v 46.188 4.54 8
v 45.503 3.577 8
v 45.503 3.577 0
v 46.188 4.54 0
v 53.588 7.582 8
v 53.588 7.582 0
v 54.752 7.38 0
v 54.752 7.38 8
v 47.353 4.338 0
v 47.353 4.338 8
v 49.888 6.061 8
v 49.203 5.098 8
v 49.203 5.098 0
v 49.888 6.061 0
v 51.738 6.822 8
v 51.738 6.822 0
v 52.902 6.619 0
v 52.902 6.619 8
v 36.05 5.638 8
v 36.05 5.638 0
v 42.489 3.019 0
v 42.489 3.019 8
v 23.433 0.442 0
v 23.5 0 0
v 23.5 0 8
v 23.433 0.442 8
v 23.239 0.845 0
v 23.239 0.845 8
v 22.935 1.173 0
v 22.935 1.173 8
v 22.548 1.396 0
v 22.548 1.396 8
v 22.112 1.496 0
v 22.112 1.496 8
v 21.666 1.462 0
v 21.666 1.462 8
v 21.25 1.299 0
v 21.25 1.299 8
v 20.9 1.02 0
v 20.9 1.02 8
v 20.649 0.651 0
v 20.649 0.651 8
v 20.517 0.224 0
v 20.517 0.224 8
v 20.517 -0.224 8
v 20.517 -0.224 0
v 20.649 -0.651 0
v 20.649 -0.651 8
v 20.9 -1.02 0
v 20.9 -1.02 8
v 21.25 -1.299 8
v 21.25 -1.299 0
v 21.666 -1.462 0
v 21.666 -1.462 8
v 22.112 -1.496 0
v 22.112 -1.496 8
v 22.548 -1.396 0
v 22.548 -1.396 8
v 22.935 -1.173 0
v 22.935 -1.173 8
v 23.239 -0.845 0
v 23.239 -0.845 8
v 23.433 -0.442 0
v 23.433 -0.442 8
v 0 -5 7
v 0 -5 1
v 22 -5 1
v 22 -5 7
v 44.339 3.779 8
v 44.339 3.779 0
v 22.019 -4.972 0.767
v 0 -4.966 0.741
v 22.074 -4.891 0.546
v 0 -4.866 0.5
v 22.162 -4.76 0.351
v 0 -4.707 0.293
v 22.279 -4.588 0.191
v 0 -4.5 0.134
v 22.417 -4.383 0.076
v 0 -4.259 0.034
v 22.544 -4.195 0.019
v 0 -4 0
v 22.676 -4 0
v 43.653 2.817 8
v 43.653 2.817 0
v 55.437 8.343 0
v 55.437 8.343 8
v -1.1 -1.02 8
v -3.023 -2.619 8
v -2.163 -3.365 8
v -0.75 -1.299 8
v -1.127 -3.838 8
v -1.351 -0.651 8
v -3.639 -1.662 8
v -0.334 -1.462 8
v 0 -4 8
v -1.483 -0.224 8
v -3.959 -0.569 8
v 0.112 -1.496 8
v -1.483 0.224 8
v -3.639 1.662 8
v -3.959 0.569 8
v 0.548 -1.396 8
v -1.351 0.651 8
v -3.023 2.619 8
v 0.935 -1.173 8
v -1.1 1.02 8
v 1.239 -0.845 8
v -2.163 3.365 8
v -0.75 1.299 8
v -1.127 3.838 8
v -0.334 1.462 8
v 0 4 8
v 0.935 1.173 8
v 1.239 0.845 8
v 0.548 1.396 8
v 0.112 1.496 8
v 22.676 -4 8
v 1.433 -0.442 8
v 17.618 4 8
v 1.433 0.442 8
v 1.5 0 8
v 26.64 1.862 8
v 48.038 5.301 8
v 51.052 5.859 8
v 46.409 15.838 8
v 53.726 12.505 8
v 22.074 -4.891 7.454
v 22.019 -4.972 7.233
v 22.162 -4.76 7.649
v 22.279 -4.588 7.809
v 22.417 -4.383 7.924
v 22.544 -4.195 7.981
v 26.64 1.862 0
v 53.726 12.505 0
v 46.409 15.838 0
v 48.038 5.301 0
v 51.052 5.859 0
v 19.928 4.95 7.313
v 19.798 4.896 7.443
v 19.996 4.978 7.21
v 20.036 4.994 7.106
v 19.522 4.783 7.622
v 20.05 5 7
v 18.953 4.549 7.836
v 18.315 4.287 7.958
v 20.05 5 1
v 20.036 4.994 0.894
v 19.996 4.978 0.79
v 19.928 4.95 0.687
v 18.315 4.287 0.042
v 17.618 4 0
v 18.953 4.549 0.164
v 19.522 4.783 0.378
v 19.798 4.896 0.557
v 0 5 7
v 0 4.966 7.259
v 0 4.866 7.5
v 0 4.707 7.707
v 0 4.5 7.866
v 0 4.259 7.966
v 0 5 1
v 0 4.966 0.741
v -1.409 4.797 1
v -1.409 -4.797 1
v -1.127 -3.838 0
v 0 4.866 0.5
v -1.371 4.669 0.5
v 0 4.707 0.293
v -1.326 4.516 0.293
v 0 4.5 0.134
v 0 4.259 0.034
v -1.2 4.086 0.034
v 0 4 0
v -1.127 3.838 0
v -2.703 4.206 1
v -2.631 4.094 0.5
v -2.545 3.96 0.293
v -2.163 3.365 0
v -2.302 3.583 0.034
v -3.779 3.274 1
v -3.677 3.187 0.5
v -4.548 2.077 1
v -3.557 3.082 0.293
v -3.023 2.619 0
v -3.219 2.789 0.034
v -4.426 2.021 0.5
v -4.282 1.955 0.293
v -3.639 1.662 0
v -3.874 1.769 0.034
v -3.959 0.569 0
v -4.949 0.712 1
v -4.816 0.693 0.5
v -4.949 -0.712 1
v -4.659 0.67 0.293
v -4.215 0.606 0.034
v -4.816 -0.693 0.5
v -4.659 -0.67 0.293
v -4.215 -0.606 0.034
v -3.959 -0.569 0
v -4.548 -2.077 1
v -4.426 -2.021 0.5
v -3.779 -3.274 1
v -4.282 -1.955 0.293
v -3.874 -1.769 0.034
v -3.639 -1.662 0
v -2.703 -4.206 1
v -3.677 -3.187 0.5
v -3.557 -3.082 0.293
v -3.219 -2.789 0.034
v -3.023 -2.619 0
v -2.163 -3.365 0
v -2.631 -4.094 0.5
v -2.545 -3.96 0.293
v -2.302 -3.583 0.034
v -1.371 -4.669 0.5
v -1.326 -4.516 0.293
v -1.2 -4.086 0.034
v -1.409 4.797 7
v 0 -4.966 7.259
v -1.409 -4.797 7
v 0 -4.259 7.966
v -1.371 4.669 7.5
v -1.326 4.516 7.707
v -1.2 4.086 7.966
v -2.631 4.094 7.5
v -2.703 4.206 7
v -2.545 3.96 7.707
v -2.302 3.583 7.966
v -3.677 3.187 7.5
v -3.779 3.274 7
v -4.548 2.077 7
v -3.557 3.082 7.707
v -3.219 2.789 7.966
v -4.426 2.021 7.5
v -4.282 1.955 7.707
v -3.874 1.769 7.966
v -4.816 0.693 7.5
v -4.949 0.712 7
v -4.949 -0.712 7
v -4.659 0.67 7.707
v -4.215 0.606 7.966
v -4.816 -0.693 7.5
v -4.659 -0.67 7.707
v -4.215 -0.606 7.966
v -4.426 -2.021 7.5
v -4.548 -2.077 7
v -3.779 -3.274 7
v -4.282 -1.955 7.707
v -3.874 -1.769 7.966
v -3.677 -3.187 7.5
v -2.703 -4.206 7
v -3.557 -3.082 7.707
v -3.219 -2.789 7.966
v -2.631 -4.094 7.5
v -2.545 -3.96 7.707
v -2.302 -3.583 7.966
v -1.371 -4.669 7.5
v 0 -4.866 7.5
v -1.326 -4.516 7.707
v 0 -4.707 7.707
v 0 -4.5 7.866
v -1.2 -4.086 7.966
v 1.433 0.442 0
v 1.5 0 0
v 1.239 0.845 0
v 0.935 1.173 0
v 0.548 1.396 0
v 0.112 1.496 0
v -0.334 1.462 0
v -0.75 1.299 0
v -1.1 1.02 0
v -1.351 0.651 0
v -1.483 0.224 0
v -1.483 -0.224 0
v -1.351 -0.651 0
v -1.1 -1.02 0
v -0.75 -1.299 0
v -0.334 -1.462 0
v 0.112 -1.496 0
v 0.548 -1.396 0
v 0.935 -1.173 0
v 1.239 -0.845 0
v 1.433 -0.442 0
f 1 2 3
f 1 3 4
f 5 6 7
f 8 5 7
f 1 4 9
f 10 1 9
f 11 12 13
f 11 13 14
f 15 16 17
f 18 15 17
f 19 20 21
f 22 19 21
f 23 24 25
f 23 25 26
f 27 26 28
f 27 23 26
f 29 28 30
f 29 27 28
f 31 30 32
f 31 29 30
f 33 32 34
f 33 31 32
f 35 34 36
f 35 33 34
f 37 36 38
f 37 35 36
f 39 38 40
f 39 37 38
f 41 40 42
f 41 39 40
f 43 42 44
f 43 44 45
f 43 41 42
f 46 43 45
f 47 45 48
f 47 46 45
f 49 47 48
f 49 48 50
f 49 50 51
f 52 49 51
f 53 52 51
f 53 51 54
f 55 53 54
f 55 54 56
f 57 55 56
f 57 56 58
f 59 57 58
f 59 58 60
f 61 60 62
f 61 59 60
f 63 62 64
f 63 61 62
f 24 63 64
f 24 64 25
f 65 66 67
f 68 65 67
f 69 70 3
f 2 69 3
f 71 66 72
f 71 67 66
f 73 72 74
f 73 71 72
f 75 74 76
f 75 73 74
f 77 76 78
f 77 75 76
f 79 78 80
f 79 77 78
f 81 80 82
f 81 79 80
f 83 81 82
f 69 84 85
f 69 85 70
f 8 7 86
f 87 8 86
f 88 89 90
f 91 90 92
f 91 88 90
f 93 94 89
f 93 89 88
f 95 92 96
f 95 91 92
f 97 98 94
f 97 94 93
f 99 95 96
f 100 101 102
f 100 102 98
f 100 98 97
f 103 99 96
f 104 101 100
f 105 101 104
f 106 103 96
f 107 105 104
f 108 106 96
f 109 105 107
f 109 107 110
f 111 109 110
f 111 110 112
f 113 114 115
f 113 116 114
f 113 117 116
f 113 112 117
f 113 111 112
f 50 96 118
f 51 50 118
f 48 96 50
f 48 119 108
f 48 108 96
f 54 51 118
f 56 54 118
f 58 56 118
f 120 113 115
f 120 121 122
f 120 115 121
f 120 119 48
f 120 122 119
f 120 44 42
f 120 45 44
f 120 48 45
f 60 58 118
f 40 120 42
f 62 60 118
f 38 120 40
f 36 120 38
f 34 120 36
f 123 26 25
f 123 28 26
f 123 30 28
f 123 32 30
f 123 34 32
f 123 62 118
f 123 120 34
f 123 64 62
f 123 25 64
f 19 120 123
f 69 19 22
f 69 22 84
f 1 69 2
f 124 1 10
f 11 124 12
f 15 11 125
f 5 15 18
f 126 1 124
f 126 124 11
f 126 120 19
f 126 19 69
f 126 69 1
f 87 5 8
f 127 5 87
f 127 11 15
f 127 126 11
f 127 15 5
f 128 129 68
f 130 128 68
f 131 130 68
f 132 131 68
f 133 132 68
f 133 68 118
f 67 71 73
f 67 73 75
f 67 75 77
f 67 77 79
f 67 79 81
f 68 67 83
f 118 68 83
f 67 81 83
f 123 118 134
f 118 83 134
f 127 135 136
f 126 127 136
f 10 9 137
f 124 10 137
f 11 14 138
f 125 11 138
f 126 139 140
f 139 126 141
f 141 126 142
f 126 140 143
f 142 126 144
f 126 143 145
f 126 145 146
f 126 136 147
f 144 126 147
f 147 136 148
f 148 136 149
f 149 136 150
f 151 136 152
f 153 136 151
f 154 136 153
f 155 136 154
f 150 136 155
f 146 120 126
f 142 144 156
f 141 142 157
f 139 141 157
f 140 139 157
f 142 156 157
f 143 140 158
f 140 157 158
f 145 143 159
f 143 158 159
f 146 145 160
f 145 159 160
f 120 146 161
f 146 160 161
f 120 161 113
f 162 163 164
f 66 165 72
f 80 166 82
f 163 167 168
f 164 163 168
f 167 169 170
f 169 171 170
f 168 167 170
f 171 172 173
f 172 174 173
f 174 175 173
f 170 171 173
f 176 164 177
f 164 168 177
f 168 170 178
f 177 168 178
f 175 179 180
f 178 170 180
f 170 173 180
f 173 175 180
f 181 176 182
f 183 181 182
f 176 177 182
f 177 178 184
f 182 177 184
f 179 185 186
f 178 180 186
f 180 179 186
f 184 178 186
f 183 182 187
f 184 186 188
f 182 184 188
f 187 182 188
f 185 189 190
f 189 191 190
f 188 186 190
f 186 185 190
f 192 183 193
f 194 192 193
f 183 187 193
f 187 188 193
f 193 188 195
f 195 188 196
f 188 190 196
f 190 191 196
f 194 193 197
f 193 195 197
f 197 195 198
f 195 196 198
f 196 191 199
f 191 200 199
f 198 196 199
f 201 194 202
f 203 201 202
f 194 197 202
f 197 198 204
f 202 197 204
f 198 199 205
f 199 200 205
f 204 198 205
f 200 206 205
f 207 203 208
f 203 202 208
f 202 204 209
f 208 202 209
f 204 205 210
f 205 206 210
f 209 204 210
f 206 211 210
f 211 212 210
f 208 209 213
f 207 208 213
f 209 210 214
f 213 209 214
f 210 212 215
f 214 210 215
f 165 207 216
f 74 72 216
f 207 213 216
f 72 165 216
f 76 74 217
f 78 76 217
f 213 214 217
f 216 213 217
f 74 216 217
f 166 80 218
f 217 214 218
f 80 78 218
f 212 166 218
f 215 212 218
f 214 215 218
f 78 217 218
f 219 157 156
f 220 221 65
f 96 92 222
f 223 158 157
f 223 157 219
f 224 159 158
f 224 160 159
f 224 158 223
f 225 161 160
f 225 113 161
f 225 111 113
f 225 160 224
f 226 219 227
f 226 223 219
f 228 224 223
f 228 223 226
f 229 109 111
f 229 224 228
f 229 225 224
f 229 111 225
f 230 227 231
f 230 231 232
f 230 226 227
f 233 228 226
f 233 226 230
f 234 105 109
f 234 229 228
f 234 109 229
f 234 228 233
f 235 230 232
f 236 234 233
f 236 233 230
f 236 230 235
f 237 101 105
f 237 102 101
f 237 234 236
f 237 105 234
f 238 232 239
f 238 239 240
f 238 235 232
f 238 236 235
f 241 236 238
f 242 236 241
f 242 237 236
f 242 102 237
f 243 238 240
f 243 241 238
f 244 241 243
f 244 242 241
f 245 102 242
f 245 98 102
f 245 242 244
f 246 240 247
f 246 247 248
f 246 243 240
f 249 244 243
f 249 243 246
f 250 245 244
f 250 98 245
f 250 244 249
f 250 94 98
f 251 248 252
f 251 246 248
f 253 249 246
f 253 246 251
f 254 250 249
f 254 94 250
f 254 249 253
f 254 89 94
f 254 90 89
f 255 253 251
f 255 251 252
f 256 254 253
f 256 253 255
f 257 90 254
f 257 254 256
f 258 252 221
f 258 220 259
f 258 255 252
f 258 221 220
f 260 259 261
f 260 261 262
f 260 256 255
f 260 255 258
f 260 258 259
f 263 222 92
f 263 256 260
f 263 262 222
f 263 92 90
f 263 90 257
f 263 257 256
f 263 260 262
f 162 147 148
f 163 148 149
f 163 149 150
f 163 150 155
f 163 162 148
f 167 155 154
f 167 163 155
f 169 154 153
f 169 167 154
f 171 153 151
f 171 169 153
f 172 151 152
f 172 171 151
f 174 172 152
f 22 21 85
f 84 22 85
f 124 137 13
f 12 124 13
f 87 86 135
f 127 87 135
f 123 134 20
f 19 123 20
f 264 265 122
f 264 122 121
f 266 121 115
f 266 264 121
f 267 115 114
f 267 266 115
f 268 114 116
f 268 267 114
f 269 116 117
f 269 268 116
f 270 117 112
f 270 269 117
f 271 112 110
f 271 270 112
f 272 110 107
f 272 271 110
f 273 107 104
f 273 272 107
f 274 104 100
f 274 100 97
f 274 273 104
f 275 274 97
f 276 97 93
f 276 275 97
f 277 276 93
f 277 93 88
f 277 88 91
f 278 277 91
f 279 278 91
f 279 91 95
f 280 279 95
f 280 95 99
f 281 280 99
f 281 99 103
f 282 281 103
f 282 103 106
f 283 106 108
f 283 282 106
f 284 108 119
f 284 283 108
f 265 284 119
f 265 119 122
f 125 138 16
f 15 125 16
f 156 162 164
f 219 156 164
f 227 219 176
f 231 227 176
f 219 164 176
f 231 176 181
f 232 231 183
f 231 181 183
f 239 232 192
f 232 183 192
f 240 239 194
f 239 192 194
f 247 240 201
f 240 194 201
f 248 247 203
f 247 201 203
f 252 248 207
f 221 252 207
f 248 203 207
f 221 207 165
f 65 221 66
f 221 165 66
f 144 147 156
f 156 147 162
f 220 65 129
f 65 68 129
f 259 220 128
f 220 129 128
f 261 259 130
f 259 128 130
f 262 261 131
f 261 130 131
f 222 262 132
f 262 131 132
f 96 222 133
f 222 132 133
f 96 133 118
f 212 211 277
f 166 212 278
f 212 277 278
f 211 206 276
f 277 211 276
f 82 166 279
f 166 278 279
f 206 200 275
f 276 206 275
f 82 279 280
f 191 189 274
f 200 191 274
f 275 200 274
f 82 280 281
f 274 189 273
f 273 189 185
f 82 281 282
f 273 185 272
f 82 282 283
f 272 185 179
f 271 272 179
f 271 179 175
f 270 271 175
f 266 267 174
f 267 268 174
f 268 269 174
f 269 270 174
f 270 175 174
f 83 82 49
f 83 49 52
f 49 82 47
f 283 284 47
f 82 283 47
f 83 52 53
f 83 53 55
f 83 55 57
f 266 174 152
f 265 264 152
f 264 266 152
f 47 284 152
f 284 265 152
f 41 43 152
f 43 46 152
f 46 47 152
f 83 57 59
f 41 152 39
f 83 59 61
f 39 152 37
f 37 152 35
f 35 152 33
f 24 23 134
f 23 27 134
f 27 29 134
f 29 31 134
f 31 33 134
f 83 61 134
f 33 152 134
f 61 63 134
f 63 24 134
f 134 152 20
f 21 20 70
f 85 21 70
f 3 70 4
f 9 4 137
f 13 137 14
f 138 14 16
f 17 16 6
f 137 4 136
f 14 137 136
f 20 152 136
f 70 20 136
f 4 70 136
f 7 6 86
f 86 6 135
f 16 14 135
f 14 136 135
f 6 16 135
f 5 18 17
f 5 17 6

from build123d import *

# Parameters (mm, degrees)
SKETCH1_R           = 1.5
BOSS_EXTRUDE1_DEPTH = 8
FILLET1_R           = 1


with BuildPart() as part:
    # Sketch1 → Boss-Extrude1 (new body)
    with BuildSketch(Plane.XY):
        with BuildLine():
            Line((20.05, 5), (0, 5))
            ThreePointArc((0, 5), (-5, 0), (0, -5))
            Line((0, -5), (22, -5))
            Line((22, -5), (26.640289064, 1.862180818))
            ThreePointArc((26.640289064, 1.862180818), (24.800812017, 4.141914056), (22, 5))
            Line((22, 5), (20.05, 5))
        make_face()
        Circle(SKETCH1_R, mode=Mode.SUBTRACT)
        with Locations((22, 0)):
            Circle(SKETCH1_R, mode=Mode.SUBTRACT)
        with BuildLine():
            Line((46.409029503, 15.837507263), (20.05, 5))
            Line((20.05, 5), (22, 5))
            ThreePointArc((22, 5), (24.800812017, 4.141914056), (26.640289064, 1.862180818))
            Line((26.640289064, 1.862180818), (36.049561342, 5.638188326))
            Line((36.049561342, 5.638188326), (42.488975113, 3.018953392))
            Line((42.488975113, 3.018953392), (43.653419291, 2.816543521))
            Line((43.653419291, 2.816543521), (44.338731569, 3.779480217))
            Line((44.338731569, 3.779480217), (45.503175747, 3.577070346))
            Line((45.503175747, 3.577070346), (46.188488025, 4.540007042))
            Line((46.188488025, 4.540007042), (47.352932204, 4.337597171))
            Line((47.352932204, 4.337597171), (48.038244482, 5.300533868))
            Line((48.038244482, 5.300533868), (49.20268866, 5.098123997))
            Line((49.20268866, 5.098123997), (49.888000938, 6.061060693))
            Line((49.888000938, 6.061060693), (51.052445116, 5.858650822))
            Line((51.052445116, 5.858650822), (51.737757394, 6.821587519))
            Line((51.737757394, 6.821587519), (52.902201573, 6.619177648))
            Line((52.902201573, 6.619177648), (53.587513851, 7.582114344))
            Line((53.587513851, 7.582114344), (54.751958029, 7.379704473))
            Line((54.751958029, 7.379704473), (55.437270307, 8.34264117))
            Line((55.437270307, 8.34264117), (53.72608495, 12.504593197))
            Line((53.72608495, 12.504593197), (46.409029503, 15.837507263))
        make_face()
    extrude(amount=BOSS_EXTRUDE1_DEPTH)

    # Fillet1
    fillet1_edges = [part.edges().sort_by_distance(p)[0] for p in [
        (11, -5, 8),
        (11, -5, 0),
        (-5, 0, 0),
        (10.025, 5, 0),
        (10.025, 5, 8),
        (-5, 0, 8),
    ]]
    fillet(fillet1_edges, radius=FILLET1_R)


solid = part.part
